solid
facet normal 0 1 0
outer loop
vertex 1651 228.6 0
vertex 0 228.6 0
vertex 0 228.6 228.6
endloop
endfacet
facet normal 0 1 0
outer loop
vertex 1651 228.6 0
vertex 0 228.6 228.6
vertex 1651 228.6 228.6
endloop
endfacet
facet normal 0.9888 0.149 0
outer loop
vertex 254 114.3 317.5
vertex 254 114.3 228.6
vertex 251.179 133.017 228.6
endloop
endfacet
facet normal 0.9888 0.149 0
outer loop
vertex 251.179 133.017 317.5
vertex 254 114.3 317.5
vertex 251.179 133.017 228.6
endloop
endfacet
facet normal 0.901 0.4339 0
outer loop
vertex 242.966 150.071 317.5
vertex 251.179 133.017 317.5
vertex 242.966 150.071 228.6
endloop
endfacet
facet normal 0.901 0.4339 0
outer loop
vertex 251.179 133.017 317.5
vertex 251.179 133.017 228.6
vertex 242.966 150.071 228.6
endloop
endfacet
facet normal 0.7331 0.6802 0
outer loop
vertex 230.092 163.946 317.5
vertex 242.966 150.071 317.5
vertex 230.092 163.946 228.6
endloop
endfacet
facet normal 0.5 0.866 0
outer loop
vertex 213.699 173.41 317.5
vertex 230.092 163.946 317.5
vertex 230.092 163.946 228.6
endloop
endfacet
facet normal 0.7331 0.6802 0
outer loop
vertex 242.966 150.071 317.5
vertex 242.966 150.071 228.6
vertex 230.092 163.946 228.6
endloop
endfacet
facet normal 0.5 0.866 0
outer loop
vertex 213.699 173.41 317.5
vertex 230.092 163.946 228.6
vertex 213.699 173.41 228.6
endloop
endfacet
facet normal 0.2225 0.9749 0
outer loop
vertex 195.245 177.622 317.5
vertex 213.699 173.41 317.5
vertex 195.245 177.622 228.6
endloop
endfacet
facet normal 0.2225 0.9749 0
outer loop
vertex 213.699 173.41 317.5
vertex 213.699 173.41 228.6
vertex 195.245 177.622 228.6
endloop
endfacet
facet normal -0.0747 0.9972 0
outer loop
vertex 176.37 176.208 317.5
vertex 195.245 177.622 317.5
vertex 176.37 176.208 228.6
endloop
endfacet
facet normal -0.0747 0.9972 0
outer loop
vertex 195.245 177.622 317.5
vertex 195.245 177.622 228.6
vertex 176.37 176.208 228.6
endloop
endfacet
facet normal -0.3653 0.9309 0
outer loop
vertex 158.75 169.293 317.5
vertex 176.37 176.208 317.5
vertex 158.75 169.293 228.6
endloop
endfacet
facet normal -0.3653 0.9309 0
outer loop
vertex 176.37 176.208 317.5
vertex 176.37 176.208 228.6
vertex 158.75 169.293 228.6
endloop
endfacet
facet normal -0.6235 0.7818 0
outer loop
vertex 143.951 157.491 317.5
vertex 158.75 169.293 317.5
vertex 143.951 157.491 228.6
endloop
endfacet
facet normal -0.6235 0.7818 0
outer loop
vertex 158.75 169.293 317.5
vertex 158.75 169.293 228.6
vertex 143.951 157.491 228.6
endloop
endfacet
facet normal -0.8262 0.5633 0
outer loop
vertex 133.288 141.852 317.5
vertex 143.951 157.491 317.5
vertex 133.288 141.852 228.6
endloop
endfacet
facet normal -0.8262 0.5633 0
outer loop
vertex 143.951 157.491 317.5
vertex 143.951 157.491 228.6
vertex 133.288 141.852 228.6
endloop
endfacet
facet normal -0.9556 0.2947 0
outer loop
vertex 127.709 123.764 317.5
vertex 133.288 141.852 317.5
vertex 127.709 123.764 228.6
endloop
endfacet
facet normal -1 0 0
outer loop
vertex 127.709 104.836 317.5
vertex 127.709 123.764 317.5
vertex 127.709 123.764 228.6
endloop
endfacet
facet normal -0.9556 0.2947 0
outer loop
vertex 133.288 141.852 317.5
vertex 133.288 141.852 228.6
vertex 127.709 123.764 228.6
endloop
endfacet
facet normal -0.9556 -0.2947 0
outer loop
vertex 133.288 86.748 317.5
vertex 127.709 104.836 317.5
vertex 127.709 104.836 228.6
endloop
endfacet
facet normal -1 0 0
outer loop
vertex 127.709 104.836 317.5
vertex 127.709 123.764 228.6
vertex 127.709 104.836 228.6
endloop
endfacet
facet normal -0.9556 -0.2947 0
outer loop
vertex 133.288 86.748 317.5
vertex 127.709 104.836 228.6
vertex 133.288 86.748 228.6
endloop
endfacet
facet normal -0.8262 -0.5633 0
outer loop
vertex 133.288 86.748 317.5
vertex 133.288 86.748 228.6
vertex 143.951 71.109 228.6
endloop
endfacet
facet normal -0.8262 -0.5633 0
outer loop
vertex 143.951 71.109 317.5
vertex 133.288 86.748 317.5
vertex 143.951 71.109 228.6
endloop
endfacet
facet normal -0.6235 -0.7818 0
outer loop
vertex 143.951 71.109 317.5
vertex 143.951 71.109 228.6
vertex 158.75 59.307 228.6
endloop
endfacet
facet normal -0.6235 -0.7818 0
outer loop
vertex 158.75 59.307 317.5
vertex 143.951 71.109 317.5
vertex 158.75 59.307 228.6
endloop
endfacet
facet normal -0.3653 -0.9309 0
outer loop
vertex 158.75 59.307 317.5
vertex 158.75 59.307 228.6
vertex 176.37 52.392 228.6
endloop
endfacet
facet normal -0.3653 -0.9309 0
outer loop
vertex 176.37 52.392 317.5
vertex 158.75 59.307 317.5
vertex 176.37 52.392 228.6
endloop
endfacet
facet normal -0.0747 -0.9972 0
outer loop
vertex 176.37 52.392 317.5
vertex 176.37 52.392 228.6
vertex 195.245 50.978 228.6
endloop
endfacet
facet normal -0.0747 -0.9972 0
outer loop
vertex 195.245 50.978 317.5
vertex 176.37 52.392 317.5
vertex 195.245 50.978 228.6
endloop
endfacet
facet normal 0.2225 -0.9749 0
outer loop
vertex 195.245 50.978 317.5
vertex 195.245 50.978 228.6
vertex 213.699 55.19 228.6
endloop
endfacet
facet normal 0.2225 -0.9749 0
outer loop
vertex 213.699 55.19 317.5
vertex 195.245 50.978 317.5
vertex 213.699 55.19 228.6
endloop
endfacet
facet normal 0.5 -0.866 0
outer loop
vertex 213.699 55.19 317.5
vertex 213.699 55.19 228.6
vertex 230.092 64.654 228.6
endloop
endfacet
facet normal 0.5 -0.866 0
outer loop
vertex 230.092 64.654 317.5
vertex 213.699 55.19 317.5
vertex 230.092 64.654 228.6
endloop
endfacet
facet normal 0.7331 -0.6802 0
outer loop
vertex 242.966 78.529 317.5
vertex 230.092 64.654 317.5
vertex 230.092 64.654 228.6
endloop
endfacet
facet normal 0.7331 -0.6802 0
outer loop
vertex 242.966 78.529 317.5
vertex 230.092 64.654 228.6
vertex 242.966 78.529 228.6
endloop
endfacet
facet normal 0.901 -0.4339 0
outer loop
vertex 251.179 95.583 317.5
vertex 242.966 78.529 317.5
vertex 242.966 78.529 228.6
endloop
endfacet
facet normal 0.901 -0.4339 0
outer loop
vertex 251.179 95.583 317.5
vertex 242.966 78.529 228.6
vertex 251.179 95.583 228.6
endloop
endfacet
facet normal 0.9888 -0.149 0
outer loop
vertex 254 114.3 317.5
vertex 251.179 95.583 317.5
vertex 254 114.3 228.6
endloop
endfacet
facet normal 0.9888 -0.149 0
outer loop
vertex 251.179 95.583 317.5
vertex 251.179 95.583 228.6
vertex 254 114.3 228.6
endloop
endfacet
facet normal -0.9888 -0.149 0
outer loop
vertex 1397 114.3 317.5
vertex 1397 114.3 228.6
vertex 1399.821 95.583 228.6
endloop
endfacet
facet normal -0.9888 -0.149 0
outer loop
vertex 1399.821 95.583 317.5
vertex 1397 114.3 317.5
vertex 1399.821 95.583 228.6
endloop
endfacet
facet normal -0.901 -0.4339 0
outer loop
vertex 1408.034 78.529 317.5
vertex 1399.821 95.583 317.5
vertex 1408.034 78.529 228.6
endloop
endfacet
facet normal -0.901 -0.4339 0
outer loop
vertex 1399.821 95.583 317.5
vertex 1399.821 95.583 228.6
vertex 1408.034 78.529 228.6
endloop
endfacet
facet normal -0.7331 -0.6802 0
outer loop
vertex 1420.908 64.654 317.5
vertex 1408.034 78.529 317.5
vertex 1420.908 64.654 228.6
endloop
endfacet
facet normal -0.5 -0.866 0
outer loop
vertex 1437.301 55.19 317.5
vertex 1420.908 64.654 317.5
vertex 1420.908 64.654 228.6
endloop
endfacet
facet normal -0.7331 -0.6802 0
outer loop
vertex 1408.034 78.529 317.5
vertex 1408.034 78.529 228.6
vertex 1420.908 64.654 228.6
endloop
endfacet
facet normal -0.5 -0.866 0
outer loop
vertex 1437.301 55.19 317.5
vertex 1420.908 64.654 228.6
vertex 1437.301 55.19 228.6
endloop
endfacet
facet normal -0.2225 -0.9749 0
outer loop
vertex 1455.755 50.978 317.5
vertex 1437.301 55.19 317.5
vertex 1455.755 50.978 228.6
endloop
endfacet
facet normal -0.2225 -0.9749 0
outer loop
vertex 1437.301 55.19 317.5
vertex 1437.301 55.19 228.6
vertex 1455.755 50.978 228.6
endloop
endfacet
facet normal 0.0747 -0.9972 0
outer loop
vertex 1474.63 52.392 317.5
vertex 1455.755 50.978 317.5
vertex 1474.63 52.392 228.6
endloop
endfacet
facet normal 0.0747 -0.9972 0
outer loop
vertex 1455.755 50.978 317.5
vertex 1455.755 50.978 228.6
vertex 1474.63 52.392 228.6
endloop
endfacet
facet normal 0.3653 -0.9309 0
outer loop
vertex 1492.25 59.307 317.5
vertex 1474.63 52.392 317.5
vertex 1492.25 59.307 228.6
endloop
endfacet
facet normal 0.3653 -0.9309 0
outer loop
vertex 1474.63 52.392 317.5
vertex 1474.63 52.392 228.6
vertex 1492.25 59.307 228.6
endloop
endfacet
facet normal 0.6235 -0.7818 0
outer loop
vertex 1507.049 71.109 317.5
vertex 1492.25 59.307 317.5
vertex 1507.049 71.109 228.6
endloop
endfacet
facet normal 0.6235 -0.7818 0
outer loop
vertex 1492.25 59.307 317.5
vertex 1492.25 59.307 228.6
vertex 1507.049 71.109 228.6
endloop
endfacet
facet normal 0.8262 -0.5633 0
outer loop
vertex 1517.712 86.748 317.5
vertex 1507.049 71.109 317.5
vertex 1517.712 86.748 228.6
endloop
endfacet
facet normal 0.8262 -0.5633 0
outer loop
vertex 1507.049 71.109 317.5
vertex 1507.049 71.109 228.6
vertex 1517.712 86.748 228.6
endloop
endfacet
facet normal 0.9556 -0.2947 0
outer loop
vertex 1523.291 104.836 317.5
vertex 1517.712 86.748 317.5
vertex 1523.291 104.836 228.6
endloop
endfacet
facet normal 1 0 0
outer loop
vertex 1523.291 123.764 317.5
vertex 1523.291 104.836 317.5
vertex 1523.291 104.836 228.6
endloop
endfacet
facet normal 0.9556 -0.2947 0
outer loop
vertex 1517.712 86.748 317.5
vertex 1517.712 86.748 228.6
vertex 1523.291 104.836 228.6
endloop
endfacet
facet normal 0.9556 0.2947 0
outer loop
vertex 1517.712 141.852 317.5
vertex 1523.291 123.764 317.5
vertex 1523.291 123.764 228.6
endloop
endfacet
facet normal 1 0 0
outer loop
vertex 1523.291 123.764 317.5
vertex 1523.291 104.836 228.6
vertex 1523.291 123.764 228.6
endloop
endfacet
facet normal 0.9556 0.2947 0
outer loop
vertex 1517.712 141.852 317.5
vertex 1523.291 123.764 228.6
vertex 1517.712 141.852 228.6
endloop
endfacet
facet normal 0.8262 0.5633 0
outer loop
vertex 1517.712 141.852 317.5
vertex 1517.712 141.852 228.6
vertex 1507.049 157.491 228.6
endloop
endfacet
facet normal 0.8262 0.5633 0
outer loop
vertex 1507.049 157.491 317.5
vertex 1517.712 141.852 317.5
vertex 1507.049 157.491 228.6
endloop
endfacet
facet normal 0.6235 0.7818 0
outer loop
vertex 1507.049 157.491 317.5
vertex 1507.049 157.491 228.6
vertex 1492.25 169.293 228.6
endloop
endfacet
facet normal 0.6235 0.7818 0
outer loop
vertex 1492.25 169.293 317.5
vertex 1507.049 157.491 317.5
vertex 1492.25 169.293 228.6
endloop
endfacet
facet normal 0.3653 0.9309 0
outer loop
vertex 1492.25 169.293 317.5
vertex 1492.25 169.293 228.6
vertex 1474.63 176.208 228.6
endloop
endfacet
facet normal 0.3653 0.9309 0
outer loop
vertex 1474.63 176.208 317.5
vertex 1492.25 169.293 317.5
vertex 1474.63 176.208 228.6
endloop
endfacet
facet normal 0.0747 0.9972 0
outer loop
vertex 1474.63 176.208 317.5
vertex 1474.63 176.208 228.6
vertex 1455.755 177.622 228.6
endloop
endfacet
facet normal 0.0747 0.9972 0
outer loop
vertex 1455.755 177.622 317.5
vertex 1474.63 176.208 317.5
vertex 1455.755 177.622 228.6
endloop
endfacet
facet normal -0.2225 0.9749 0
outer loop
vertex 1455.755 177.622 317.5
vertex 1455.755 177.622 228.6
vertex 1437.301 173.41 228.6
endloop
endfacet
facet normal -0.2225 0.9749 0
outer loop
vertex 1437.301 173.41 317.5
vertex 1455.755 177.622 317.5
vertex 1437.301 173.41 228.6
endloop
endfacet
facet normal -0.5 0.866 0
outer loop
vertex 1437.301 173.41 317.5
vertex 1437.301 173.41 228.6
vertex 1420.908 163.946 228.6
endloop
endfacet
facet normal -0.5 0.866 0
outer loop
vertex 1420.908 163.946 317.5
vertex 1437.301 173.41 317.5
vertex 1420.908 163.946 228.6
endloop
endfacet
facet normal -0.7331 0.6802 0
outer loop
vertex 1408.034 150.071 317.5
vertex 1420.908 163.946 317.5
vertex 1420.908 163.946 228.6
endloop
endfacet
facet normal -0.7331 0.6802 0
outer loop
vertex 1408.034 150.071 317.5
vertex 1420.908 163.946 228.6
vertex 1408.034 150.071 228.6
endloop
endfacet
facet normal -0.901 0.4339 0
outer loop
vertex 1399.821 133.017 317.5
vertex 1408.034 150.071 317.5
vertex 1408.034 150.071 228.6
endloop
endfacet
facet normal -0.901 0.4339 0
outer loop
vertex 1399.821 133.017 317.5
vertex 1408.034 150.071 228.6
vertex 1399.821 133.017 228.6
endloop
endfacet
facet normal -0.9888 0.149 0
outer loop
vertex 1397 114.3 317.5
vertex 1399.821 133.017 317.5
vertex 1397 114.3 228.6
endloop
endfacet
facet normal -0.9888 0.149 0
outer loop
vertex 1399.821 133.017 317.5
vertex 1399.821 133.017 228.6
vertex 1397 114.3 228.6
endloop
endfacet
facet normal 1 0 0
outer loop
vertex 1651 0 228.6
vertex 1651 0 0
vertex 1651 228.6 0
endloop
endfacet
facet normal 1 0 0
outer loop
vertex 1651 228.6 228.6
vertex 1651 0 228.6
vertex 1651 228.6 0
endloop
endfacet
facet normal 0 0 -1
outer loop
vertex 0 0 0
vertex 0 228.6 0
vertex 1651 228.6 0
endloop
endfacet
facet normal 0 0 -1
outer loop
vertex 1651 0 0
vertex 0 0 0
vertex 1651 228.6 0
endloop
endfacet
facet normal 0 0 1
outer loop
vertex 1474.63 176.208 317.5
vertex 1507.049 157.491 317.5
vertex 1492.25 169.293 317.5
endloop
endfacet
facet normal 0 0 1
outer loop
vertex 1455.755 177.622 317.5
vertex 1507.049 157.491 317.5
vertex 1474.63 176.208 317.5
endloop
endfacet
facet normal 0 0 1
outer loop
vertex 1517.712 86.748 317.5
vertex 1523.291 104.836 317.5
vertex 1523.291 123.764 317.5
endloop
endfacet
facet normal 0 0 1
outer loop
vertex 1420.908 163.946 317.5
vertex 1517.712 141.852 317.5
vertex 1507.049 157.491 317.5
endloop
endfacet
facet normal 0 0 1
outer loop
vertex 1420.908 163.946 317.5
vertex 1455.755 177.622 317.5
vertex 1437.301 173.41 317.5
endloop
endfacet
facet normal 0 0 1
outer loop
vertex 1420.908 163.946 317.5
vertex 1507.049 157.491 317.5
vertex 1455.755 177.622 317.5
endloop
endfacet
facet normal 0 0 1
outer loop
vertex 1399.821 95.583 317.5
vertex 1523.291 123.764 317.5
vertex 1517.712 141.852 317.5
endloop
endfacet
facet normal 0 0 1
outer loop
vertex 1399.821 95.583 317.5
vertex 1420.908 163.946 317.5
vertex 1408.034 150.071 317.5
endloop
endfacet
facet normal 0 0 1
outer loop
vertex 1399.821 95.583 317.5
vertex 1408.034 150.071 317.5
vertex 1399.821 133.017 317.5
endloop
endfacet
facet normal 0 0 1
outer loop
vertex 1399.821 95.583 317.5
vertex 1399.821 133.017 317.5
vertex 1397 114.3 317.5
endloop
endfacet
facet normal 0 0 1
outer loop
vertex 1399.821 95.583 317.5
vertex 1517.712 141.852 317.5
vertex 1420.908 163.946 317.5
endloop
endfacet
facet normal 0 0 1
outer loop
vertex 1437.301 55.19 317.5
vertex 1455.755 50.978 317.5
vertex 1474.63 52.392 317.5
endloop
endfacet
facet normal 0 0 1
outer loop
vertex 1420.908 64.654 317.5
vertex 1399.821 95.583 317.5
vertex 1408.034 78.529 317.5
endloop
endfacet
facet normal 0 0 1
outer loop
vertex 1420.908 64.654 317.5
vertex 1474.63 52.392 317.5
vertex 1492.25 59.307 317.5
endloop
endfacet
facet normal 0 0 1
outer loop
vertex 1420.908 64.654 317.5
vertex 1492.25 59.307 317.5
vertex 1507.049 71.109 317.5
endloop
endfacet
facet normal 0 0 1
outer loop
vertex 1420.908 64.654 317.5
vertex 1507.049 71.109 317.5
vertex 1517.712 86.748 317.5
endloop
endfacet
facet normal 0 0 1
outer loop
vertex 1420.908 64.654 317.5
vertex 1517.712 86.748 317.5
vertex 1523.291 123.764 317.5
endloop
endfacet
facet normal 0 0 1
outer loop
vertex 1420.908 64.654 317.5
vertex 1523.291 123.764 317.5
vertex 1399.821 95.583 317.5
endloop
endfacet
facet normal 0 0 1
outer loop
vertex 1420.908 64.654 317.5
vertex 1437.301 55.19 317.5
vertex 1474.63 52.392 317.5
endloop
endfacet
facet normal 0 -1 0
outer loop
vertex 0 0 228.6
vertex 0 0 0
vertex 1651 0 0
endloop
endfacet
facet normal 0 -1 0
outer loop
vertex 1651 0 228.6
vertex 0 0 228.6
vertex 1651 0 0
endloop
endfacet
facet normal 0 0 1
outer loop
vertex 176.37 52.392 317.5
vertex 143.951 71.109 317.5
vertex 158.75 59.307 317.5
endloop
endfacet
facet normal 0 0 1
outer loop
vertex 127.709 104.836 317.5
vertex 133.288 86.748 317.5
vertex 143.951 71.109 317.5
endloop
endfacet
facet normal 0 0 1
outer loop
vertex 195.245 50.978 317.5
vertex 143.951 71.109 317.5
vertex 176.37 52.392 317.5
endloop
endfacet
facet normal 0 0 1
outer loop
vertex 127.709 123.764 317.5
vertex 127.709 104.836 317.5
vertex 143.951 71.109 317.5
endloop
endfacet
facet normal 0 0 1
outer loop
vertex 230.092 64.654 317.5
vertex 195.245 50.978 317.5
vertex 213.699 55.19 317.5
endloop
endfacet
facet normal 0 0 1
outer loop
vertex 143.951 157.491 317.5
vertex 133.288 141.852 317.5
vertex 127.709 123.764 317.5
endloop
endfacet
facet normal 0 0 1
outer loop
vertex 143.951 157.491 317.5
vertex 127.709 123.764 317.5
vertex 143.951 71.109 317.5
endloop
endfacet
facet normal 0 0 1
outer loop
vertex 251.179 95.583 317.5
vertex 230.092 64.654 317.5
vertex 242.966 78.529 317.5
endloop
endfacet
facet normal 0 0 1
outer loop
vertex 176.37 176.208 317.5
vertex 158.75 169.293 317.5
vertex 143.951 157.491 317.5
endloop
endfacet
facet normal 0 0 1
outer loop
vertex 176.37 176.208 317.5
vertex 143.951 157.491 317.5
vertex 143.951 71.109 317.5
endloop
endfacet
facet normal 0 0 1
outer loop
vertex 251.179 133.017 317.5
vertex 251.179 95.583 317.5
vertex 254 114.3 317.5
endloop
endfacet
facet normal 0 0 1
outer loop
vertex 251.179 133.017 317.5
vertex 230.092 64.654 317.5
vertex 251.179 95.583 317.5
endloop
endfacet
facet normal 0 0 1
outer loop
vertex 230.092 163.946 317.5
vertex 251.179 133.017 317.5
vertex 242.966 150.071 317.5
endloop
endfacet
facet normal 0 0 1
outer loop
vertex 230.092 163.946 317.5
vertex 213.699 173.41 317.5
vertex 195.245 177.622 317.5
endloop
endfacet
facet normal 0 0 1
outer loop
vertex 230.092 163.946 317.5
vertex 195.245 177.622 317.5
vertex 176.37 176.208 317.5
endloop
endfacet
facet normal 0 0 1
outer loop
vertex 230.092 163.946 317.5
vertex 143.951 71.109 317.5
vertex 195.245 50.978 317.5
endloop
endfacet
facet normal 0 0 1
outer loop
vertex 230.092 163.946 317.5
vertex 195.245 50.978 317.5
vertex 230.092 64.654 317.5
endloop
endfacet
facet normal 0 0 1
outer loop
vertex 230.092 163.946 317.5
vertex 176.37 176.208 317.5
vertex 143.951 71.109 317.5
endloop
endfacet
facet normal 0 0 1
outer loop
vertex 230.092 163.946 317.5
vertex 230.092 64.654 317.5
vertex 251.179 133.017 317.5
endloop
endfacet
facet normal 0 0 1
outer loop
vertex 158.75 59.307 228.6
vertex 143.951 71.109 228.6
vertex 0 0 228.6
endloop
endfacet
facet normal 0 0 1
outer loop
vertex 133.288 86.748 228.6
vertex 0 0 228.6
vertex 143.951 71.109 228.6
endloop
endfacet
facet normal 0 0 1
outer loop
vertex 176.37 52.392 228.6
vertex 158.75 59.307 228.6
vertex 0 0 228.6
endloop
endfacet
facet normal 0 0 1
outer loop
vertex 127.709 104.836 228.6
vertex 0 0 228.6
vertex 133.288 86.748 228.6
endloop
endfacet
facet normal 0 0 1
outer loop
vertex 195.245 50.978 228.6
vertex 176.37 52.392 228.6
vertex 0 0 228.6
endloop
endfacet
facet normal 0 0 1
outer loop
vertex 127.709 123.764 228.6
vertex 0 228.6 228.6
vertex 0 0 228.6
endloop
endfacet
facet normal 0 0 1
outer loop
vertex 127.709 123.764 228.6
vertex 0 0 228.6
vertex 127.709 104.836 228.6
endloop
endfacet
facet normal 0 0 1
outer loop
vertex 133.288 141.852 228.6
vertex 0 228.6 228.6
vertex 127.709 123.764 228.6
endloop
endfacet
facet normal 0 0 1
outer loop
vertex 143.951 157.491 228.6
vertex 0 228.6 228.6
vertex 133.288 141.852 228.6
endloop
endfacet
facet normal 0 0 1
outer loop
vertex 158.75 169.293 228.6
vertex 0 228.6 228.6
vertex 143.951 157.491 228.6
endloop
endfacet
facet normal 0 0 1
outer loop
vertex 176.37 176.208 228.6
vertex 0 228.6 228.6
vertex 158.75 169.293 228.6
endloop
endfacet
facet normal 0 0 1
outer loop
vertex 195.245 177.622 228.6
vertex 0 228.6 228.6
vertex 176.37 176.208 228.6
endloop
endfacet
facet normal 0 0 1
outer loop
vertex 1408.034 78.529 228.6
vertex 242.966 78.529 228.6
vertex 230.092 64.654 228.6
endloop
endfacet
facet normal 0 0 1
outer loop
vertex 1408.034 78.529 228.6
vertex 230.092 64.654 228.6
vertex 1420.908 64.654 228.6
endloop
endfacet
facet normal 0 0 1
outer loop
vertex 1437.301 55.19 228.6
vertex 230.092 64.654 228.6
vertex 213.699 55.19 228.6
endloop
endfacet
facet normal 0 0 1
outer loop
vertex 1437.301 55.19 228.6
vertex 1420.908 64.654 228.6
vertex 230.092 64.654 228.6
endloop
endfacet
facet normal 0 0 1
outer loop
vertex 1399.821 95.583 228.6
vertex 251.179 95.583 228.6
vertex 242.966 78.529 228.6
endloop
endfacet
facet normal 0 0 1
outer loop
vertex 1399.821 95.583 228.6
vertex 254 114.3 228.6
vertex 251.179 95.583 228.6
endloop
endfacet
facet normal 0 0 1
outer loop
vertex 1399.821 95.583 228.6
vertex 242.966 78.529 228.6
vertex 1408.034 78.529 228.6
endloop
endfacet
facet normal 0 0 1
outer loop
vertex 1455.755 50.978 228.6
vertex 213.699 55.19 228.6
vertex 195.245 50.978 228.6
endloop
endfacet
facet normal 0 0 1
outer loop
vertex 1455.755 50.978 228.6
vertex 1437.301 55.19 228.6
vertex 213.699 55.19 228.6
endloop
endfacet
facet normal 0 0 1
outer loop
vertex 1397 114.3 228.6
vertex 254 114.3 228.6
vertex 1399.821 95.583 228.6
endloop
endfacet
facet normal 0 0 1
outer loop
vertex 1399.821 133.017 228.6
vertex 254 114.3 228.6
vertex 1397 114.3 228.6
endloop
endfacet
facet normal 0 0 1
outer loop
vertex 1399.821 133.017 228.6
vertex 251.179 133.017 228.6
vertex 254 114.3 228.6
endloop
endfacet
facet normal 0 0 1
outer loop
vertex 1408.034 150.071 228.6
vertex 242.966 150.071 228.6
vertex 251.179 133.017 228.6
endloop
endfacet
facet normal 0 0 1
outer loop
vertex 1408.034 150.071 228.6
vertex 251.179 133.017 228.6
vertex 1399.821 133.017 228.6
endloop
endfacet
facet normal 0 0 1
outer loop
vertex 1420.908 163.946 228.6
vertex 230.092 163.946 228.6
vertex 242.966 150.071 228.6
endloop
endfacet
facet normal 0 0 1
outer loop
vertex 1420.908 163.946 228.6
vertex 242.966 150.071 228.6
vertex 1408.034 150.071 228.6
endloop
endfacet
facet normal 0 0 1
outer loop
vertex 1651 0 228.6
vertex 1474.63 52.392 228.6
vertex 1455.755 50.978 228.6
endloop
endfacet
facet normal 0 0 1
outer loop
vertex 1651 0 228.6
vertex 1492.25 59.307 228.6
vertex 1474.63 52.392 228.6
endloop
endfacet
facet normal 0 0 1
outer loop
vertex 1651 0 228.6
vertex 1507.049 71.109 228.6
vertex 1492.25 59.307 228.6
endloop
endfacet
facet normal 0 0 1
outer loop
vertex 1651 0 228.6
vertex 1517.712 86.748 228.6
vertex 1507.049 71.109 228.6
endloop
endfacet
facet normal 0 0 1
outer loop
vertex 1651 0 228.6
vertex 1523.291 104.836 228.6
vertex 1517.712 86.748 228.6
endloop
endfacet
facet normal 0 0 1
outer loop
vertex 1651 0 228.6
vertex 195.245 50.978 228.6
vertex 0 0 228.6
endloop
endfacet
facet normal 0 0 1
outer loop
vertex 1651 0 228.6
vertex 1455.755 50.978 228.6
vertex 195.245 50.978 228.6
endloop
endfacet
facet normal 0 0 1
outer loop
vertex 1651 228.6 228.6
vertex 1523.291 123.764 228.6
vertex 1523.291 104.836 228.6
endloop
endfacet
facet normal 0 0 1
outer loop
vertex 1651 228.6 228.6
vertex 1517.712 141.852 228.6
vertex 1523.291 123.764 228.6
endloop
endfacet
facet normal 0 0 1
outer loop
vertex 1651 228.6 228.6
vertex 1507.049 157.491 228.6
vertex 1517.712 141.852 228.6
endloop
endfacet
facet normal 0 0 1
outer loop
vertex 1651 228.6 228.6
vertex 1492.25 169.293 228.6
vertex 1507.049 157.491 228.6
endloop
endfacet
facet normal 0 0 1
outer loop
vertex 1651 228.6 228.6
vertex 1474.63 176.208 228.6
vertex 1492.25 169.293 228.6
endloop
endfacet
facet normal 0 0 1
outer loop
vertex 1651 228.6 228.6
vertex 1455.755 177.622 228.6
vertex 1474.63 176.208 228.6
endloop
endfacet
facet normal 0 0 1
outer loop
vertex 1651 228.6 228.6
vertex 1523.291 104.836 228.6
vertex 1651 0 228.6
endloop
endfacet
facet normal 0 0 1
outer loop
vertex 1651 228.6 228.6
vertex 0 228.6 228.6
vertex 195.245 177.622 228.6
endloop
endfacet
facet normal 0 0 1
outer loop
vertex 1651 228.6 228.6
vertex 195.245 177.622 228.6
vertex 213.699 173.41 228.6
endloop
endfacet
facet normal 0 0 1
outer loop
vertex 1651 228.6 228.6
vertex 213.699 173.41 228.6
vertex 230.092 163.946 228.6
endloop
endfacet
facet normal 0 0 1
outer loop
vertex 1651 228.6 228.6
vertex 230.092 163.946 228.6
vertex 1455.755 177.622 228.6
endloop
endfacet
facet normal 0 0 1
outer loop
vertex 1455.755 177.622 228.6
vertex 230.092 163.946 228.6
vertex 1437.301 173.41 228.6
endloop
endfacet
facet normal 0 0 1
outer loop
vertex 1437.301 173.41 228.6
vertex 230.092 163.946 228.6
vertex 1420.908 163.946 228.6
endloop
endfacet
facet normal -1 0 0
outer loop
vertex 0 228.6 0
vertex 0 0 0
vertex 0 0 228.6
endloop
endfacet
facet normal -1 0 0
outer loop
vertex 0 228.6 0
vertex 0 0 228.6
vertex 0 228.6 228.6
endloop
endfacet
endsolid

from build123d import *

# Parameters (mm, degrees)
SKETCH1_W           = 1651
SKETCH1_H           = 228.6
BOSS_EXTRUDE1_DEPTH = 228.6
SKETCH2_R           = 63.5
BOSS_EXTRUDE2_DEPTH = 88.9


with BuildPart() as part:
    # Sketch1 → Boss-Extrude1 (new body)
    with BuildSketch(Plane.XY):
        with Locations((825.5, 114.3)):
            Rectangle(SKETCH1_W, SKETCH1_H)
    extrude(amount=BOSS_EXTRUDE1_DEPTH)

    # Sketch2 → Boss-Extrude2 (add)
    with BuildSketch(Plane.XY.offset(228.6)):
        with Locations((190.5, 114.3)):
            Circle(SKETCH2_R)
        with Locations(Location((1460.5, 114.3, 0), (0, 0, 180))):  # turned: the seam where the file's is
            Circle(SKETCH2_R)
    extrude(amount=BOSS_EXTRUDE2_DEPTH)


solid = part.part
